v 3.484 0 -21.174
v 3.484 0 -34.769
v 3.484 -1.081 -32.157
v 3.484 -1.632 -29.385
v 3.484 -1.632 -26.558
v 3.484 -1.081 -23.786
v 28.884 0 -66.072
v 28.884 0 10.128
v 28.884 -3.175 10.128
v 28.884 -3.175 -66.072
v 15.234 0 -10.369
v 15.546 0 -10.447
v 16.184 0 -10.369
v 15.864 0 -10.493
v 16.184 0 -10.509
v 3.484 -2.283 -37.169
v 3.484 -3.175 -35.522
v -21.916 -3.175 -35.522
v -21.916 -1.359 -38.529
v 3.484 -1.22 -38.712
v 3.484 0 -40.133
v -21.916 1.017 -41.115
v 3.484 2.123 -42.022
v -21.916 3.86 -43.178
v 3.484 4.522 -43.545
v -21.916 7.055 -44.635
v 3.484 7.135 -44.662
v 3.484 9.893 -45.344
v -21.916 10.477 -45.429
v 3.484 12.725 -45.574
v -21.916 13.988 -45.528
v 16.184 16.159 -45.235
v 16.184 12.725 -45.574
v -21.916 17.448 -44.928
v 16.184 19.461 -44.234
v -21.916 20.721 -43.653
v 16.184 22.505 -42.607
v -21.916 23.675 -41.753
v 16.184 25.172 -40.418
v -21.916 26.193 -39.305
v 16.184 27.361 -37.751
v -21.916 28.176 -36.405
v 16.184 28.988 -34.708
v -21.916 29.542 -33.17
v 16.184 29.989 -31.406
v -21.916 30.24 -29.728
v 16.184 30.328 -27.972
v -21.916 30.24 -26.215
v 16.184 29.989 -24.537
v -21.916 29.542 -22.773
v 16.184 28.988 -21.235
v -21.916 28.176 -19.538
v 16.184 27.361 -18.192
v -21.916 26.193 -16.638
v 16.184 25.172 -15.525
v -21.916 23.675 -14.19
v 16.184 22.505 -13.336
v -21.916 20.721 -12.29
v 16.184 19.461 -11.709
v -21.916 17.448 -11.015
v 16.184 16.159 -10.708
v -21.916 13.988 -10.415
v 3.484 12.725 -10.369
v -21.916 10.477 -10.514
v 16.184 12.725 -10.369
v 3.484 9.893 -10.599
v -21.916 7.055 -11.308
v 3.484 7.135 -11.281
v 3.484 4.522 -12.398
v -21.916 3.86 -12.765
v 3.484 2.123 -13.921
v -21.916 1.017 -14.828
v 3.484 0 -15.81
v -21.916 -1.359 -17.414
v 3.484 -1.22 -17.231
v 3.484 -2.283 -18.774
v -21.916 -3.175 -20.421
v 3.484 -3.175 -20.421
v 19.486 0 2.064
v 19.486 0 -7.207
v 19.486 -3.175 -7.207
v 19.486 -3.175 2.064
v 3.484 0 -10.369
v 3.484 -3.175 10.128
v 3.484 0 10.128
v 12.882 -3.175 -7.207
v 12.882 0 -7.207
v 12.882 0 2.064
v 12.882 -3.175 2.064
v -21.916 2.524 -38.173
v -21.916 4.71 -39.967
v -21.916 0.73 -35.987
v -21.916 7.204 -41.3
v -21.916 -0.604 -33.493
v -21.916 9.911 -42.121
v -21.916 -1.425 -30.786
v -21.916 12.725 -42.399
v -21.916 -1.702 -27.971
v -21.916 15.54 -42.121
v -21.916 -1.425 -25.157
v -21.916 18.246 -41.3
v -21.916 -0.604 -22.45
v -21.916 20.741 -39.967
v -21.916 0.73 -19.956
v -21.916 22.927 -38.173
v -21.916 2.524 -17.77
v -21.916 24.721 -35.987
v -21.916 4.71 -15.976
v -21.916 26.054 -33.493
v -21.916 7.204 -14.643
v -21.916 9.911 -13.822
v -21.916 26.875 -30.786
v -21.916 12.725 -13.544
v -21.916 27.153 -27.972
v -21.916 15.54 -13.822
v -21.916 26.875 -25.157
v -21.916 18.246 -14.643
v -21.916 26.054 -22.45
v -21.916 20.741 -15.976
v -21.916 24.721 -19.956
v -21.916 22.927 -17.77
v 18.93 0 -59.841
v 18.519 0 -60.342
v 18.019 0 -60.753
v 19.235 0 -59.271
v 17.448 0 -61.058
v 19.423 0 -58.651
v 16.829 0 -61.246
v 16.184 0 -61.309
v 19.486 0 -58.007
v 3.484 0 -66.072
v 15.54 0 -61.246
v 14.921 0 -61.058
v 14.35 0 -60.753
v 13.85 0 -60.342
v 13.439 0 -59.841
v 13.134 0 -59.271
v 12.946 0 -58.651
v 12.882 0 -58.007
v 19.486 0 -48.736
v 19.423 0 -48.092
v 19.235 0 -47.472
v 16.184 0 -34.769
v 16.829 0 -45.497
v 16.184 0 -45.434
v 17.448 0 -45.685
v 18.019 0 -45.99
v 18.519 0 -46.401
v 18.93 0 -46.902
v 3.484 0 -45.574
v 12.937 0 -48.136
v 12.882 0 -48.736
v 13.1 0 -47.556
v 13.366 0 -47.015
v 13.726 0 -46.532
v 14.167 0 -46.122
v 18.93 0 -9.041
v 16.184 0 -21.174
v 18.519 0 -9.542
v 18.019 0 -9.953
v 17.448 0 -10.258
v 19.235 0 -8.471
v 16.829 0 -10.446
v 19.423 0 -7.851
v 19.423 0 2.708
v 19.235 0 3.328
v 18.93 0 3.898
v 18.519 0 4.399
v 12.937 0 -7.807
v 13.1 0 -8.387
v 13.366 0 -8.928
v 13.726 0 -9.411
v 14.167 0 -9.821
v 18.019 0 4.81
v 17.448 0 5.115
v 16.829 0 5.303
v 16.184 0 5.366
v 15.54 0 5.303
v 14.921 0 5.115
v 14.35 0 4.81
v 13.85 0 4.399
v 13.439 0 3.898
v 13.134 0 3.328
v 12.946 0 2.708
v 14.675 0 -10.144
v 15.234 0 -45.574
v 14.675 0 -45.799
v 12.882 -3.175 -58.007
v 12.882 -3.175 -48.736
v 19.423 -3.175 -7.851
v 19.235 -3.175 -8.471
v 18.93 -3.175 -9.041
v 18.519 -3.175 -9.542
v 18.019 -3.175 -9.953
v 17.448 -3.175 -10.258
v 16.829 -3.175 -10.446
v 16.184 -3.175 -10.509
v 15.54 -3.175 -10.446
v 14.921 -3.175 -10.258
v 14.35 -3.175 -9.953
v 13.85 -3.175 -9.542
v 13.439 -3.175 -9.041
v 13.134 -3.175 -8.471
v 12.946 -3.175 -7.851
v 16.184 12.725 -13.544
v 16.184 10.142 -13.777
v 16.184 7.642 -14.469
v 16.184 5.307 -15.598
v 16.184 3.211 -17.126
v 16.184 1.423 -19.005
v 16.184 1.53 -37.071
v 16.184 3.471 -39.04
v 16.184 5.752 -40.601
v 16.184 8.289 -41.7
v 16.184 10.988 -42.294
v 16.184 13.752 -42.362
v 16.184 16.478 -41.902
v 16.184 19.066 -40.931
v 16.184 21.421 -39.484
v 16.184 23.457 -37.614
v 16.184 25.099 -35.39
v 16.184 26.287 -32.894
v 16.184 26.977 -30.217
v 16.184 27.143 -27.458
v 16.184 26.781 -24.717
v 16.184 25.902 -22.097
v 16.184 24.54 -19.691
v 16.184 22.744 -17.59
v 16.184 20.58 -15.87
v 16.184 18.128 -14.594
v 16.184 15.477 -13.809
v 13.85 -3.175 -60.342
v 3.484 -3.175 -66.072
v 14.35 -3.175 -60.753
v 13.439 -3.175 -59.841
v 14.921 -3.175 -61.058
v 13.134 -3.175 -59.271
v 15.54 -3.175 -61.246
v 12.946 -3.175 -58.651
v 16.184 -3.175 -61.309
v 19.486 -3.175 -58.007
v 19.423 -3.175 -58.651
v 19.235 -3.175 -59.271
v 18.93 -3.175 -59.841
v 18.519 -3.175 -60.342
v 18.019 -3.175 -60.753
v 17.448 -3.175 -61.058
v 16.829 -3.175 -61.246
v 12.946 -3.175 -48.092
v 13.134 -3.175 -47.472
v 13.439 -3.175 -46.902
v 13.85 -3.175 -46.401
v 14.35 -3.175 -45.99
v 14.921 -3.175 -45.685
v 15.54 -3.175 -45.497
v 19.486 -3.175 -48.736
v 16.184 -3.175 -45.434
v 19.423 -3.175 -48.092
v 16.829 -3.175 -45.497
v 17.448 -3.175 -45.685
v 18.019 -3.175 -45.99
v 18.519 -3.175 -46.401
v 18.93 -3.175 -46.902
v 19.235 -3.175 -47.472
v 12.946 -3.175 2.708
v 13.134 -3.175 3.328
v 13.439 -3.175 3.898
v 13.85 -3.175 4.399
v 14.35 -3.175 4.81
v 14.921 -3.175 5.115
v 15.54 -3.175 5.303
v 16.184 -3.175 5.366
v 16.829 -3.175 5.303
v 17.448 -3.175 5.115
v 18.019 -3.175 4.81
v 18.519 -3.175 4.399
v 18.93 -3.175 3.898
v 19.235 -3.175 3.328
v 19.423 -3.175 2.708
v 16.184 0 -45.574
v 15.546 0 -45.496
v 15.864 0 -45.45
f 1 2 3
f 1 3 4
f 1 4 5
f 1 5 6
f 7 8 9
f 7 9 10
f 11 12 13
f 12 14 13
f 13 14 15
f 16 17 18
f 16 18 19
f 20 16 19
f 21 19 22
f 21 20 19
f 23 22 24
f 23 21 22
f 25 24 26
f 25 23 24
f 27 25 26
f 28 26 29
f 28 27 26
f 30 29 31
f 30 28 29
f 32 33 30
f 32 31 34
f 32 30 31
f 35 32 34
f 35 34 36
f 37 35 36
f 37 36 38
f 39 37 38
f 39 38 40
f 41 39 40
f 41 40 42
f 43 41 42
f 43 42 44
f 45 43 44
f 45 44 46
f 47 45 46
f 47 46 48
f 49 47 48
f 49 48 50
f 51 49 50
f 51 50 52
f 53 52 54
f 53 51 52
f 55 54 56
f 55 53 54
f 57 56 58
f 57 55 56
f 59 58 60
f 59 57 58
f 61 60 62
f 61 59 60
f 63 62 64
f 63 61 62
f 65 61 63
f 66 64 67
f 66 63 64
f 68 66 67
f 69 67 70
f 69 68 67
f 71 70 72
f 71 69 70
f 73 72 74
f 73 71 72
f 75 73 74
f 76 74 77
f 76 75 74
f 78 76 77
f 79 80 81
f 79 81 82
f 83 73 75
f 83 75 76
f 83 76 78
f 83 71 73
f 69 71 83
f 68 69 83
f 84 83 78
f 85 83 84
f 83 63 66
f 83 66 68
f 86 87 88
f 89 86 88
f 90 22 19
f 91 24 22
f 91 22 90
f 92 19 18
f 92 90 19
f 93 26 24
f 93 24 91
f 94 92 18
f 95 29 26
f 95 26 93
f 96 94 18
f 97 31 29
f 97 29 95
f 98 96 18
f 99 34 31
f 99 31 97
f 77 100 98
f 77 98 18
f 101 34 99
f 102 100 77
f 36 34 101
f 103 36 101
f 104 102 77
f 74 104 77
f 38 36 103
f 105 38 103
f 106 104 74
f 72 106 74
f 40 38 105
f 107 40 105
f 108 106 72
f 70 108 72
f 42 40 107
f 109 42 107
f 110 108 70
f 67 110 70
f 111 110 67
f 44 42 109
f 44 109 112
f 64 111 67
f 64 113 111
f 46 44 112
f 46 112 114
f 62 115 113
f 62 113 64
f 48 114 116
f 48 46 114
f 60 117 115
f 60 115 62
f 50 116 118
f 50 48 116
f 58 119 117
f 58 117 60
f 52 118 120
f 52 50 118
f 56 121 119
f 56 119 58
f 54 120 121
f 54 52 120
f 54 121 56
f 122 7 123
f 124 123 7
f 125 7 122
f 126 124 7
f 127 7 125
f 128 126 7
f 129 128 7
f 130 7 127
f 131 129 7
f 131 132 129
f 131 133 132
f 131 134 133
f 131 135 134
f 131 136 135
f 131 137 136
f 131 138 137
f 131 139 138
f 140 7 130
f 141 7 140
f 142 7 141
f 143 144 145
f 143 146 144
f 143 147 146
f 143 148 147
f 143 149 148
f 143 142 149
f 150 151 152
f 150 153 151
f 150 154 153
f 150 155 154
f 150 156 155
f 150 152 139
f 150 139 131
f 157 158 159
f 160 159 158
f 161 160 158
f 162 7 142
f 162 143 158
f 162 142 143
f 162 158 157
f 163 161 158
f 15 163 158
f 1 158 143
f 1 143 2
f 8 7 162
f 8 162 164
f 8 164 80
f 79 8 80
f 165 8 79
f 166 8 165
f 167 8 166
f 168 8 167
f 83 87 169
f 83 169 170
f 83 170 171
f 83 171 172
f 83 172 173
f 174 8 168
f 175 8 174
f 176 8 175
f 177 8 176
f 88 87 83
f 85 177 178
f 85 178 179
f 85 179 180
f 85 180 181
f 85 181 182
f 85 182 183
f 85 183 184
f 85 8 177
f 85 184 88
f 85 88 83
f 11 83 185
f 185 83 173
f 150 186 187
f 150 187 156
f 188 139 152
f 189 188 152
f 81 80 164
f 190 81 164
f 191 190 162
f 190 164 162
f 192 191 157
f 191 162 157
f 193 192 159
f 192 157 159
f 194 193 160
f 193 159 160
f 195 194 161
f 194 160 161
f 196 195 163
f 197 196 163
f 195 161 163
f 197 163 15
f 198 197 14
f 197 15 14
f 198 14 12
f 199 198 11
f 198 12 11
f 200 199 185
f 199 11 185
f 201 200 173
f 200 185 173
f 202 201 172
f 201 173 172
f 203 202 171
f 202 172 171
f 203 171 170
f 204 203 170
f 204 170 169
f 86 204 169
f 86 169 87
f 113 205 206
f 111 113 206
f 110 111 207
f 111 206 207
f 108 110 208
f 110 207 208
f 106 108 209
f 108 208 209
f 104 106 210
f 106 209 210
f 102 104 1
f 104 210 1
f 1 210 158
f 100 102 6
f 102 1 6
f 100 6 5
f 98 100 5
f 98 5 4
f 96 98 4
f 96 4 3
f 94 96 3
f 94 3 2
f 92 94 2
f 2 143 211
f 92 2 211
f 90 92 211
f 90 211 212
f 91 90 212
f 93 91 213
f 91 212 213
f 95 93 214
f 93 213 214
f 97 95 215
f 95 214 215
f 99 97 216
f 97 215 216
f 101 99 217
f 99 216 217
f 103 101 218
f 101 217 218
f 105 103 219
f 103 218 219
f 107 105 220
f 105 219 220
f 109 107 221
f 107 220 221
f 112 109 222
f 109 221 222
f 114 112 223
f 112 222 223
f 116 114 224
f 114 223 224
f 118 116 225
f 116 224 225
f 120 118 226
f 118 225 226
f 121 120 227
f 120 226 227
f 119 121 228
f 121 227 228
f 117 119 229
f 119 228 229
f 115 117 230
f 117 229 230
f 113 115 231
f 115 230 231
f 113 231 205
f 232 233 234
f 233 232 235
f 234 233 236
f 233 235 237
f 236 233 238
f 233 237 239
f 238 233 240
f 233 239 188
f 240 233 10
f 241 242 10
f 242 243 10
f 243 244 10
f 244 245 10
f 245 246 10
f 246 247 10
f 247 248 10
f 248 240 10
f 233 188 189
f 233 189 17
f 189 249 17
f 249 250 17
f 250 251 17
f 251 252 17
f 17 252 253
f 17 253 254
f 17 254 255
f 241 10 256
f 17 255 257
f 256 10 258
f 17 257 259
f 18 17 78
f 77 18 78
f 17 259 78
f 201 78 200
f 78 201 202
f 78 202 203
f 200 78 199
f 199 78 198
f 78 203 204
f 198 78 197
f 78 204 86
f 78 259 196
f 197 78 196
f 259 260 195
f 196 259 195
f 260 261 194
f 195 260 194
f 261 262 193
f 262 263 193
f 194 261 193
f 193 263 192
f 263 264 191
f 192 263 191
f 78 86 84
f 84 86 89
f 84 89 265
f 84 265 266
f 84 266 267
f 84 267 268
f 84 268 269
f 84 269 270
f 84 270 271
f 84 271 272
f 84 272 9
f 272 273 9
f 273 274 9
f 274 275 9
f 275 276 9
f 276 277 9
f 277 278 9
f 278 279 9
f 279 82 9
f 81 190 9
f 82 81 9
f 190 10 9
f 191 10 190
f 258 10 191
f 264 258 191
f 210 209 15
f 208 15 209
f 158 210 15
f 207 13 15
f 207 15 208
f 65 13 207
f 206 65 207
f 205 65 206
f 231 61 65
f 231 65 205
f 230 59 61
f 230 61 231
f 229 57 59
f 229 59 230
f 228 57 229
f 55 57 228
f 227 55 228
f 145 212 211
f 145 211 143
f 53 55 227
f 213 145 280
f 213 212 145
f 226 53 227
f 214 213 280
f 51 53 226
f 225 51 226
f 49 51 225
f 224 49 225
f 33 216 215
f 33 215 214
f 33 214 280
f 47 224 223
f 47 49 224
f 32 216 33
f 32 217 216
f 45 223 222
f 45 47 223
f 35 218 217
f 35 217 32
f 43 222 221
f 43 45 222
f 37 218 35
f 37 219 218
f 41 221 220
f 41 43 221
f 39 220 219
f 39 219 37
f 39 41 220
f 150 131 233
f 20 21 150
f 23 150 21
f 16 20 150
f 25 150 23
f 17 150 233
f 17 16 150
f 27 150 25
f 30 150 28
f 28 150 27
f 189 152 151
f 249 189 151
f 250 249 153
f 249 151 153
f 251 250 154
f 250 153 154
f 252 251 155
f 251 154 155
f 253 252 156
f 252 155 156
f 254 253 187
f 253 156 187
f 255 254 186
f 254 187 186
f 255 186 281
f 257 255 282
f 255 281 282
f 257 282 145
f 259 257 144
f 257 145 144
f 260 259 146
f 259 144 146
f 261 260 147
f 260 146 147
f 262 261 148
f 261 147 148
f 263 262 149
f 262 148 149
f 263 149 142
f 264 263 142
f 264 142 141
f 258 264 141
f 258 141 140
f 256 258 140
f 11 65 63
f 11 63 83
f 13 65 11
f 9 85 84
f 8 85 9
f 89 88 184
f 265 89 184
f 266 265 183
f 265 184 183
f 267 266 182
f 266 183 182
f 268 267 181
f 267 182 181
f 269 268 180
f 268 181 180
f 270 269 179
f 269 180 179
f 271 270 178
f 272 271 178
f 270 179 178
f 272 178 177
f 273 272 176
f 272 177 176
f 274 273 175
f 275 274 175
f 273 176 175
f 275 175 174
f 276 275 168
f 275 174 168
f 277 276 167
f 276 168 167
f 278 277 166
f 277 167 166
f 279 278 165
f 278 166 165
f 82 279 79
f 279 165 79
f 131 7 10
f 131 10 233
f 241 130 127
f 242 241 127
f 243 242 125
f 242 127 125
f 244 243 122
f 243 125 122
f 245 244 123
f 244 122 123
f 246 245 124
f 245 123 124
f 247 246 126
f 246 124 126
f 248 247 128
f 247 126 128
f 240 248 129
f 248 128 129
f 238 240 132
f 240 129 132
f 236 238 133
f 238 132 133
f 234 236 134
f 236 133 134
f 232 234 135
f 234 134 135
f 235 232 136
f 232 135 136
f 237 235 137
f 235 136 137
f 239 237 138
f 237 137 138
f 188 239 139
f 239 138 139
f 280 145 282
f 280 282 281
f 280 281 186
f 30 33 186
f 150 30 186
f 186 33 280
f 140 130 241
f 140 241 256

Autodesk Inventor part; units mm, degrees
ref_plane "YZ Plane" through (0, 0, 0) normal (1, 0, 0) x (0, 1, 0)
ref_plane "XZ Plane" through (0, 0, 0) normal (0, 1, 0) x (-1, 0, 0)
sketch "Sketch1" plane through (0, 0, 0) normal (0, 1, 0) x (-1, 0, 0)
  line L0 (-3.4844, 10.1285) -> (-28.8844, 10.1285)
  line L1 (-28.8844, 10.1285) -> (-28.8844, -66.0715)
  line L2 (-28.8844, -66.0715) -> (-3.4844, -66.0715)
  line L3 (-3.4844, -66.0715) -> (-3.4844, 10.1285)
  dimension "d0" = 25.4
  dimension "d1" = 76.2
extrude "Extrusion1" add sketch "Sketch1" against normal blind 3.175
sketch "Sketch7" plane through (3.4844, 0, -66.0715) normal (-1, 0, 0) x (0, 0, 1)
  line L0 (76.2, -3.175) -> (0, -3.175) projected
  circle A0 centre (38.1, 12.7254) radius 6.35
  circle A1 centre (38.1, 12.7254) radius 14.4272
  arc A2 (45.6508, -3.175) -> (30.5492, -3.175) centre (38.1, 12.7254) ccw
  point P0 (38.1, -3.175)
  dimension "d24" = 15.9004
  dimension "d25" = 12.7
  dimension "d26" = 28.8544
  dimension "d57" = 3.175
extrude "Extrusion7" add sketch "Sketch7" along normal mid plane 25.4 contours L0 A2
sketch "Sketch8" plane through (16.1844, 0, -66.0715) normal (1, 0, 0) x (0, 0, -1)
  line L0 (-25.9385, 0) -> (-31.3023, 0) projected
  arc A0 (-25.9385, 0) -> (-50.2615, 0) centre (-38.1, 12.7254) ccw projected
  arc A1 (-30.5492, -3.175) -> (-45.6508, -3.175) centre (-38.1, 12.7254) ccw projected
  line L1 (-55.7022, 12.7254) -> (-55.7022, 0)
  line L2 (-50.2615, 0) -> (-76.2, 0) projected
  line L3 (-20.4978, 12.7254) -> (-20.4978, 0)
  line L4 (-76.2, 0) -> (0, 0) projected
extrude "Extrusion8" add sketch "Sketch8" against normal blind 12.7 contours A0 L3 L4 | L2 L1 A0
sketch "Sketch10" plane through (0, 0, 0) normal (0, 1, 0) x (1, 0, 0)
  arc A0 (12.8824, -2.064) -> (19.4864, -2.064) centre (16.1844, -2.064) ccw
  arc A1 (19.4864, 7.207) -> (12.8824, 7.207) centre (16.1844, 7.207) ccw
  line L0 (12.8824, 7.207) -> (12.8824, -2.064)
  line L1 (19.4864, 7.207) -> (19.4864, -2.064)
  line L2 (19.4864, 2.5715) -> (20.5922, 2.5715)
  line L3 (29.0114, 27.9715) -> (23.9538, 27.9715)
  line L4 (16.1844, 10.509) -> (16.1844, -5.366)
  line L5 (28.8844, 66.0715) -> (3.4844, 66.0715) projected
  line L6 (28.8844, -10.1285) -> (28.8844, 66.0715) projected
  dimension "d43" = 6.604
  dimension "d44" = 6.604
  dimension "d45" = 25.4
  dimension "d53" = 15.875
extrude "Extrusion10" cut sketch "Sketch10" against normal blind 25.4
sketch "Sketch11" plane through (-9.2156, 0, -66.0715) normal (-1, 0, 0) x (0, 0, 1)
  circle A0 centre (38.1, 12.7254) radius 14.4272 projected
  arc A1 (45.6508, -3.175) -> (30.5492, -3.175) centre (38.1, 12.7254) ccw projected
  line L0 (30.5492, -3.175) -> (45.6508, -3.175) projected
extrude "Extrusion11" add sketch "Sketch11" along normal blind 12.7
ref_plane "Work Plane2" through (3.4844, 0, -27.9715) normal (0, 0, 1) x (1, 0, 0)
mirror "Mirror1" about plane through (3.4844, 0, -27.9715) normal (0, 0, 1) of "Extrusion10"
properties part number "Bearing mount"
